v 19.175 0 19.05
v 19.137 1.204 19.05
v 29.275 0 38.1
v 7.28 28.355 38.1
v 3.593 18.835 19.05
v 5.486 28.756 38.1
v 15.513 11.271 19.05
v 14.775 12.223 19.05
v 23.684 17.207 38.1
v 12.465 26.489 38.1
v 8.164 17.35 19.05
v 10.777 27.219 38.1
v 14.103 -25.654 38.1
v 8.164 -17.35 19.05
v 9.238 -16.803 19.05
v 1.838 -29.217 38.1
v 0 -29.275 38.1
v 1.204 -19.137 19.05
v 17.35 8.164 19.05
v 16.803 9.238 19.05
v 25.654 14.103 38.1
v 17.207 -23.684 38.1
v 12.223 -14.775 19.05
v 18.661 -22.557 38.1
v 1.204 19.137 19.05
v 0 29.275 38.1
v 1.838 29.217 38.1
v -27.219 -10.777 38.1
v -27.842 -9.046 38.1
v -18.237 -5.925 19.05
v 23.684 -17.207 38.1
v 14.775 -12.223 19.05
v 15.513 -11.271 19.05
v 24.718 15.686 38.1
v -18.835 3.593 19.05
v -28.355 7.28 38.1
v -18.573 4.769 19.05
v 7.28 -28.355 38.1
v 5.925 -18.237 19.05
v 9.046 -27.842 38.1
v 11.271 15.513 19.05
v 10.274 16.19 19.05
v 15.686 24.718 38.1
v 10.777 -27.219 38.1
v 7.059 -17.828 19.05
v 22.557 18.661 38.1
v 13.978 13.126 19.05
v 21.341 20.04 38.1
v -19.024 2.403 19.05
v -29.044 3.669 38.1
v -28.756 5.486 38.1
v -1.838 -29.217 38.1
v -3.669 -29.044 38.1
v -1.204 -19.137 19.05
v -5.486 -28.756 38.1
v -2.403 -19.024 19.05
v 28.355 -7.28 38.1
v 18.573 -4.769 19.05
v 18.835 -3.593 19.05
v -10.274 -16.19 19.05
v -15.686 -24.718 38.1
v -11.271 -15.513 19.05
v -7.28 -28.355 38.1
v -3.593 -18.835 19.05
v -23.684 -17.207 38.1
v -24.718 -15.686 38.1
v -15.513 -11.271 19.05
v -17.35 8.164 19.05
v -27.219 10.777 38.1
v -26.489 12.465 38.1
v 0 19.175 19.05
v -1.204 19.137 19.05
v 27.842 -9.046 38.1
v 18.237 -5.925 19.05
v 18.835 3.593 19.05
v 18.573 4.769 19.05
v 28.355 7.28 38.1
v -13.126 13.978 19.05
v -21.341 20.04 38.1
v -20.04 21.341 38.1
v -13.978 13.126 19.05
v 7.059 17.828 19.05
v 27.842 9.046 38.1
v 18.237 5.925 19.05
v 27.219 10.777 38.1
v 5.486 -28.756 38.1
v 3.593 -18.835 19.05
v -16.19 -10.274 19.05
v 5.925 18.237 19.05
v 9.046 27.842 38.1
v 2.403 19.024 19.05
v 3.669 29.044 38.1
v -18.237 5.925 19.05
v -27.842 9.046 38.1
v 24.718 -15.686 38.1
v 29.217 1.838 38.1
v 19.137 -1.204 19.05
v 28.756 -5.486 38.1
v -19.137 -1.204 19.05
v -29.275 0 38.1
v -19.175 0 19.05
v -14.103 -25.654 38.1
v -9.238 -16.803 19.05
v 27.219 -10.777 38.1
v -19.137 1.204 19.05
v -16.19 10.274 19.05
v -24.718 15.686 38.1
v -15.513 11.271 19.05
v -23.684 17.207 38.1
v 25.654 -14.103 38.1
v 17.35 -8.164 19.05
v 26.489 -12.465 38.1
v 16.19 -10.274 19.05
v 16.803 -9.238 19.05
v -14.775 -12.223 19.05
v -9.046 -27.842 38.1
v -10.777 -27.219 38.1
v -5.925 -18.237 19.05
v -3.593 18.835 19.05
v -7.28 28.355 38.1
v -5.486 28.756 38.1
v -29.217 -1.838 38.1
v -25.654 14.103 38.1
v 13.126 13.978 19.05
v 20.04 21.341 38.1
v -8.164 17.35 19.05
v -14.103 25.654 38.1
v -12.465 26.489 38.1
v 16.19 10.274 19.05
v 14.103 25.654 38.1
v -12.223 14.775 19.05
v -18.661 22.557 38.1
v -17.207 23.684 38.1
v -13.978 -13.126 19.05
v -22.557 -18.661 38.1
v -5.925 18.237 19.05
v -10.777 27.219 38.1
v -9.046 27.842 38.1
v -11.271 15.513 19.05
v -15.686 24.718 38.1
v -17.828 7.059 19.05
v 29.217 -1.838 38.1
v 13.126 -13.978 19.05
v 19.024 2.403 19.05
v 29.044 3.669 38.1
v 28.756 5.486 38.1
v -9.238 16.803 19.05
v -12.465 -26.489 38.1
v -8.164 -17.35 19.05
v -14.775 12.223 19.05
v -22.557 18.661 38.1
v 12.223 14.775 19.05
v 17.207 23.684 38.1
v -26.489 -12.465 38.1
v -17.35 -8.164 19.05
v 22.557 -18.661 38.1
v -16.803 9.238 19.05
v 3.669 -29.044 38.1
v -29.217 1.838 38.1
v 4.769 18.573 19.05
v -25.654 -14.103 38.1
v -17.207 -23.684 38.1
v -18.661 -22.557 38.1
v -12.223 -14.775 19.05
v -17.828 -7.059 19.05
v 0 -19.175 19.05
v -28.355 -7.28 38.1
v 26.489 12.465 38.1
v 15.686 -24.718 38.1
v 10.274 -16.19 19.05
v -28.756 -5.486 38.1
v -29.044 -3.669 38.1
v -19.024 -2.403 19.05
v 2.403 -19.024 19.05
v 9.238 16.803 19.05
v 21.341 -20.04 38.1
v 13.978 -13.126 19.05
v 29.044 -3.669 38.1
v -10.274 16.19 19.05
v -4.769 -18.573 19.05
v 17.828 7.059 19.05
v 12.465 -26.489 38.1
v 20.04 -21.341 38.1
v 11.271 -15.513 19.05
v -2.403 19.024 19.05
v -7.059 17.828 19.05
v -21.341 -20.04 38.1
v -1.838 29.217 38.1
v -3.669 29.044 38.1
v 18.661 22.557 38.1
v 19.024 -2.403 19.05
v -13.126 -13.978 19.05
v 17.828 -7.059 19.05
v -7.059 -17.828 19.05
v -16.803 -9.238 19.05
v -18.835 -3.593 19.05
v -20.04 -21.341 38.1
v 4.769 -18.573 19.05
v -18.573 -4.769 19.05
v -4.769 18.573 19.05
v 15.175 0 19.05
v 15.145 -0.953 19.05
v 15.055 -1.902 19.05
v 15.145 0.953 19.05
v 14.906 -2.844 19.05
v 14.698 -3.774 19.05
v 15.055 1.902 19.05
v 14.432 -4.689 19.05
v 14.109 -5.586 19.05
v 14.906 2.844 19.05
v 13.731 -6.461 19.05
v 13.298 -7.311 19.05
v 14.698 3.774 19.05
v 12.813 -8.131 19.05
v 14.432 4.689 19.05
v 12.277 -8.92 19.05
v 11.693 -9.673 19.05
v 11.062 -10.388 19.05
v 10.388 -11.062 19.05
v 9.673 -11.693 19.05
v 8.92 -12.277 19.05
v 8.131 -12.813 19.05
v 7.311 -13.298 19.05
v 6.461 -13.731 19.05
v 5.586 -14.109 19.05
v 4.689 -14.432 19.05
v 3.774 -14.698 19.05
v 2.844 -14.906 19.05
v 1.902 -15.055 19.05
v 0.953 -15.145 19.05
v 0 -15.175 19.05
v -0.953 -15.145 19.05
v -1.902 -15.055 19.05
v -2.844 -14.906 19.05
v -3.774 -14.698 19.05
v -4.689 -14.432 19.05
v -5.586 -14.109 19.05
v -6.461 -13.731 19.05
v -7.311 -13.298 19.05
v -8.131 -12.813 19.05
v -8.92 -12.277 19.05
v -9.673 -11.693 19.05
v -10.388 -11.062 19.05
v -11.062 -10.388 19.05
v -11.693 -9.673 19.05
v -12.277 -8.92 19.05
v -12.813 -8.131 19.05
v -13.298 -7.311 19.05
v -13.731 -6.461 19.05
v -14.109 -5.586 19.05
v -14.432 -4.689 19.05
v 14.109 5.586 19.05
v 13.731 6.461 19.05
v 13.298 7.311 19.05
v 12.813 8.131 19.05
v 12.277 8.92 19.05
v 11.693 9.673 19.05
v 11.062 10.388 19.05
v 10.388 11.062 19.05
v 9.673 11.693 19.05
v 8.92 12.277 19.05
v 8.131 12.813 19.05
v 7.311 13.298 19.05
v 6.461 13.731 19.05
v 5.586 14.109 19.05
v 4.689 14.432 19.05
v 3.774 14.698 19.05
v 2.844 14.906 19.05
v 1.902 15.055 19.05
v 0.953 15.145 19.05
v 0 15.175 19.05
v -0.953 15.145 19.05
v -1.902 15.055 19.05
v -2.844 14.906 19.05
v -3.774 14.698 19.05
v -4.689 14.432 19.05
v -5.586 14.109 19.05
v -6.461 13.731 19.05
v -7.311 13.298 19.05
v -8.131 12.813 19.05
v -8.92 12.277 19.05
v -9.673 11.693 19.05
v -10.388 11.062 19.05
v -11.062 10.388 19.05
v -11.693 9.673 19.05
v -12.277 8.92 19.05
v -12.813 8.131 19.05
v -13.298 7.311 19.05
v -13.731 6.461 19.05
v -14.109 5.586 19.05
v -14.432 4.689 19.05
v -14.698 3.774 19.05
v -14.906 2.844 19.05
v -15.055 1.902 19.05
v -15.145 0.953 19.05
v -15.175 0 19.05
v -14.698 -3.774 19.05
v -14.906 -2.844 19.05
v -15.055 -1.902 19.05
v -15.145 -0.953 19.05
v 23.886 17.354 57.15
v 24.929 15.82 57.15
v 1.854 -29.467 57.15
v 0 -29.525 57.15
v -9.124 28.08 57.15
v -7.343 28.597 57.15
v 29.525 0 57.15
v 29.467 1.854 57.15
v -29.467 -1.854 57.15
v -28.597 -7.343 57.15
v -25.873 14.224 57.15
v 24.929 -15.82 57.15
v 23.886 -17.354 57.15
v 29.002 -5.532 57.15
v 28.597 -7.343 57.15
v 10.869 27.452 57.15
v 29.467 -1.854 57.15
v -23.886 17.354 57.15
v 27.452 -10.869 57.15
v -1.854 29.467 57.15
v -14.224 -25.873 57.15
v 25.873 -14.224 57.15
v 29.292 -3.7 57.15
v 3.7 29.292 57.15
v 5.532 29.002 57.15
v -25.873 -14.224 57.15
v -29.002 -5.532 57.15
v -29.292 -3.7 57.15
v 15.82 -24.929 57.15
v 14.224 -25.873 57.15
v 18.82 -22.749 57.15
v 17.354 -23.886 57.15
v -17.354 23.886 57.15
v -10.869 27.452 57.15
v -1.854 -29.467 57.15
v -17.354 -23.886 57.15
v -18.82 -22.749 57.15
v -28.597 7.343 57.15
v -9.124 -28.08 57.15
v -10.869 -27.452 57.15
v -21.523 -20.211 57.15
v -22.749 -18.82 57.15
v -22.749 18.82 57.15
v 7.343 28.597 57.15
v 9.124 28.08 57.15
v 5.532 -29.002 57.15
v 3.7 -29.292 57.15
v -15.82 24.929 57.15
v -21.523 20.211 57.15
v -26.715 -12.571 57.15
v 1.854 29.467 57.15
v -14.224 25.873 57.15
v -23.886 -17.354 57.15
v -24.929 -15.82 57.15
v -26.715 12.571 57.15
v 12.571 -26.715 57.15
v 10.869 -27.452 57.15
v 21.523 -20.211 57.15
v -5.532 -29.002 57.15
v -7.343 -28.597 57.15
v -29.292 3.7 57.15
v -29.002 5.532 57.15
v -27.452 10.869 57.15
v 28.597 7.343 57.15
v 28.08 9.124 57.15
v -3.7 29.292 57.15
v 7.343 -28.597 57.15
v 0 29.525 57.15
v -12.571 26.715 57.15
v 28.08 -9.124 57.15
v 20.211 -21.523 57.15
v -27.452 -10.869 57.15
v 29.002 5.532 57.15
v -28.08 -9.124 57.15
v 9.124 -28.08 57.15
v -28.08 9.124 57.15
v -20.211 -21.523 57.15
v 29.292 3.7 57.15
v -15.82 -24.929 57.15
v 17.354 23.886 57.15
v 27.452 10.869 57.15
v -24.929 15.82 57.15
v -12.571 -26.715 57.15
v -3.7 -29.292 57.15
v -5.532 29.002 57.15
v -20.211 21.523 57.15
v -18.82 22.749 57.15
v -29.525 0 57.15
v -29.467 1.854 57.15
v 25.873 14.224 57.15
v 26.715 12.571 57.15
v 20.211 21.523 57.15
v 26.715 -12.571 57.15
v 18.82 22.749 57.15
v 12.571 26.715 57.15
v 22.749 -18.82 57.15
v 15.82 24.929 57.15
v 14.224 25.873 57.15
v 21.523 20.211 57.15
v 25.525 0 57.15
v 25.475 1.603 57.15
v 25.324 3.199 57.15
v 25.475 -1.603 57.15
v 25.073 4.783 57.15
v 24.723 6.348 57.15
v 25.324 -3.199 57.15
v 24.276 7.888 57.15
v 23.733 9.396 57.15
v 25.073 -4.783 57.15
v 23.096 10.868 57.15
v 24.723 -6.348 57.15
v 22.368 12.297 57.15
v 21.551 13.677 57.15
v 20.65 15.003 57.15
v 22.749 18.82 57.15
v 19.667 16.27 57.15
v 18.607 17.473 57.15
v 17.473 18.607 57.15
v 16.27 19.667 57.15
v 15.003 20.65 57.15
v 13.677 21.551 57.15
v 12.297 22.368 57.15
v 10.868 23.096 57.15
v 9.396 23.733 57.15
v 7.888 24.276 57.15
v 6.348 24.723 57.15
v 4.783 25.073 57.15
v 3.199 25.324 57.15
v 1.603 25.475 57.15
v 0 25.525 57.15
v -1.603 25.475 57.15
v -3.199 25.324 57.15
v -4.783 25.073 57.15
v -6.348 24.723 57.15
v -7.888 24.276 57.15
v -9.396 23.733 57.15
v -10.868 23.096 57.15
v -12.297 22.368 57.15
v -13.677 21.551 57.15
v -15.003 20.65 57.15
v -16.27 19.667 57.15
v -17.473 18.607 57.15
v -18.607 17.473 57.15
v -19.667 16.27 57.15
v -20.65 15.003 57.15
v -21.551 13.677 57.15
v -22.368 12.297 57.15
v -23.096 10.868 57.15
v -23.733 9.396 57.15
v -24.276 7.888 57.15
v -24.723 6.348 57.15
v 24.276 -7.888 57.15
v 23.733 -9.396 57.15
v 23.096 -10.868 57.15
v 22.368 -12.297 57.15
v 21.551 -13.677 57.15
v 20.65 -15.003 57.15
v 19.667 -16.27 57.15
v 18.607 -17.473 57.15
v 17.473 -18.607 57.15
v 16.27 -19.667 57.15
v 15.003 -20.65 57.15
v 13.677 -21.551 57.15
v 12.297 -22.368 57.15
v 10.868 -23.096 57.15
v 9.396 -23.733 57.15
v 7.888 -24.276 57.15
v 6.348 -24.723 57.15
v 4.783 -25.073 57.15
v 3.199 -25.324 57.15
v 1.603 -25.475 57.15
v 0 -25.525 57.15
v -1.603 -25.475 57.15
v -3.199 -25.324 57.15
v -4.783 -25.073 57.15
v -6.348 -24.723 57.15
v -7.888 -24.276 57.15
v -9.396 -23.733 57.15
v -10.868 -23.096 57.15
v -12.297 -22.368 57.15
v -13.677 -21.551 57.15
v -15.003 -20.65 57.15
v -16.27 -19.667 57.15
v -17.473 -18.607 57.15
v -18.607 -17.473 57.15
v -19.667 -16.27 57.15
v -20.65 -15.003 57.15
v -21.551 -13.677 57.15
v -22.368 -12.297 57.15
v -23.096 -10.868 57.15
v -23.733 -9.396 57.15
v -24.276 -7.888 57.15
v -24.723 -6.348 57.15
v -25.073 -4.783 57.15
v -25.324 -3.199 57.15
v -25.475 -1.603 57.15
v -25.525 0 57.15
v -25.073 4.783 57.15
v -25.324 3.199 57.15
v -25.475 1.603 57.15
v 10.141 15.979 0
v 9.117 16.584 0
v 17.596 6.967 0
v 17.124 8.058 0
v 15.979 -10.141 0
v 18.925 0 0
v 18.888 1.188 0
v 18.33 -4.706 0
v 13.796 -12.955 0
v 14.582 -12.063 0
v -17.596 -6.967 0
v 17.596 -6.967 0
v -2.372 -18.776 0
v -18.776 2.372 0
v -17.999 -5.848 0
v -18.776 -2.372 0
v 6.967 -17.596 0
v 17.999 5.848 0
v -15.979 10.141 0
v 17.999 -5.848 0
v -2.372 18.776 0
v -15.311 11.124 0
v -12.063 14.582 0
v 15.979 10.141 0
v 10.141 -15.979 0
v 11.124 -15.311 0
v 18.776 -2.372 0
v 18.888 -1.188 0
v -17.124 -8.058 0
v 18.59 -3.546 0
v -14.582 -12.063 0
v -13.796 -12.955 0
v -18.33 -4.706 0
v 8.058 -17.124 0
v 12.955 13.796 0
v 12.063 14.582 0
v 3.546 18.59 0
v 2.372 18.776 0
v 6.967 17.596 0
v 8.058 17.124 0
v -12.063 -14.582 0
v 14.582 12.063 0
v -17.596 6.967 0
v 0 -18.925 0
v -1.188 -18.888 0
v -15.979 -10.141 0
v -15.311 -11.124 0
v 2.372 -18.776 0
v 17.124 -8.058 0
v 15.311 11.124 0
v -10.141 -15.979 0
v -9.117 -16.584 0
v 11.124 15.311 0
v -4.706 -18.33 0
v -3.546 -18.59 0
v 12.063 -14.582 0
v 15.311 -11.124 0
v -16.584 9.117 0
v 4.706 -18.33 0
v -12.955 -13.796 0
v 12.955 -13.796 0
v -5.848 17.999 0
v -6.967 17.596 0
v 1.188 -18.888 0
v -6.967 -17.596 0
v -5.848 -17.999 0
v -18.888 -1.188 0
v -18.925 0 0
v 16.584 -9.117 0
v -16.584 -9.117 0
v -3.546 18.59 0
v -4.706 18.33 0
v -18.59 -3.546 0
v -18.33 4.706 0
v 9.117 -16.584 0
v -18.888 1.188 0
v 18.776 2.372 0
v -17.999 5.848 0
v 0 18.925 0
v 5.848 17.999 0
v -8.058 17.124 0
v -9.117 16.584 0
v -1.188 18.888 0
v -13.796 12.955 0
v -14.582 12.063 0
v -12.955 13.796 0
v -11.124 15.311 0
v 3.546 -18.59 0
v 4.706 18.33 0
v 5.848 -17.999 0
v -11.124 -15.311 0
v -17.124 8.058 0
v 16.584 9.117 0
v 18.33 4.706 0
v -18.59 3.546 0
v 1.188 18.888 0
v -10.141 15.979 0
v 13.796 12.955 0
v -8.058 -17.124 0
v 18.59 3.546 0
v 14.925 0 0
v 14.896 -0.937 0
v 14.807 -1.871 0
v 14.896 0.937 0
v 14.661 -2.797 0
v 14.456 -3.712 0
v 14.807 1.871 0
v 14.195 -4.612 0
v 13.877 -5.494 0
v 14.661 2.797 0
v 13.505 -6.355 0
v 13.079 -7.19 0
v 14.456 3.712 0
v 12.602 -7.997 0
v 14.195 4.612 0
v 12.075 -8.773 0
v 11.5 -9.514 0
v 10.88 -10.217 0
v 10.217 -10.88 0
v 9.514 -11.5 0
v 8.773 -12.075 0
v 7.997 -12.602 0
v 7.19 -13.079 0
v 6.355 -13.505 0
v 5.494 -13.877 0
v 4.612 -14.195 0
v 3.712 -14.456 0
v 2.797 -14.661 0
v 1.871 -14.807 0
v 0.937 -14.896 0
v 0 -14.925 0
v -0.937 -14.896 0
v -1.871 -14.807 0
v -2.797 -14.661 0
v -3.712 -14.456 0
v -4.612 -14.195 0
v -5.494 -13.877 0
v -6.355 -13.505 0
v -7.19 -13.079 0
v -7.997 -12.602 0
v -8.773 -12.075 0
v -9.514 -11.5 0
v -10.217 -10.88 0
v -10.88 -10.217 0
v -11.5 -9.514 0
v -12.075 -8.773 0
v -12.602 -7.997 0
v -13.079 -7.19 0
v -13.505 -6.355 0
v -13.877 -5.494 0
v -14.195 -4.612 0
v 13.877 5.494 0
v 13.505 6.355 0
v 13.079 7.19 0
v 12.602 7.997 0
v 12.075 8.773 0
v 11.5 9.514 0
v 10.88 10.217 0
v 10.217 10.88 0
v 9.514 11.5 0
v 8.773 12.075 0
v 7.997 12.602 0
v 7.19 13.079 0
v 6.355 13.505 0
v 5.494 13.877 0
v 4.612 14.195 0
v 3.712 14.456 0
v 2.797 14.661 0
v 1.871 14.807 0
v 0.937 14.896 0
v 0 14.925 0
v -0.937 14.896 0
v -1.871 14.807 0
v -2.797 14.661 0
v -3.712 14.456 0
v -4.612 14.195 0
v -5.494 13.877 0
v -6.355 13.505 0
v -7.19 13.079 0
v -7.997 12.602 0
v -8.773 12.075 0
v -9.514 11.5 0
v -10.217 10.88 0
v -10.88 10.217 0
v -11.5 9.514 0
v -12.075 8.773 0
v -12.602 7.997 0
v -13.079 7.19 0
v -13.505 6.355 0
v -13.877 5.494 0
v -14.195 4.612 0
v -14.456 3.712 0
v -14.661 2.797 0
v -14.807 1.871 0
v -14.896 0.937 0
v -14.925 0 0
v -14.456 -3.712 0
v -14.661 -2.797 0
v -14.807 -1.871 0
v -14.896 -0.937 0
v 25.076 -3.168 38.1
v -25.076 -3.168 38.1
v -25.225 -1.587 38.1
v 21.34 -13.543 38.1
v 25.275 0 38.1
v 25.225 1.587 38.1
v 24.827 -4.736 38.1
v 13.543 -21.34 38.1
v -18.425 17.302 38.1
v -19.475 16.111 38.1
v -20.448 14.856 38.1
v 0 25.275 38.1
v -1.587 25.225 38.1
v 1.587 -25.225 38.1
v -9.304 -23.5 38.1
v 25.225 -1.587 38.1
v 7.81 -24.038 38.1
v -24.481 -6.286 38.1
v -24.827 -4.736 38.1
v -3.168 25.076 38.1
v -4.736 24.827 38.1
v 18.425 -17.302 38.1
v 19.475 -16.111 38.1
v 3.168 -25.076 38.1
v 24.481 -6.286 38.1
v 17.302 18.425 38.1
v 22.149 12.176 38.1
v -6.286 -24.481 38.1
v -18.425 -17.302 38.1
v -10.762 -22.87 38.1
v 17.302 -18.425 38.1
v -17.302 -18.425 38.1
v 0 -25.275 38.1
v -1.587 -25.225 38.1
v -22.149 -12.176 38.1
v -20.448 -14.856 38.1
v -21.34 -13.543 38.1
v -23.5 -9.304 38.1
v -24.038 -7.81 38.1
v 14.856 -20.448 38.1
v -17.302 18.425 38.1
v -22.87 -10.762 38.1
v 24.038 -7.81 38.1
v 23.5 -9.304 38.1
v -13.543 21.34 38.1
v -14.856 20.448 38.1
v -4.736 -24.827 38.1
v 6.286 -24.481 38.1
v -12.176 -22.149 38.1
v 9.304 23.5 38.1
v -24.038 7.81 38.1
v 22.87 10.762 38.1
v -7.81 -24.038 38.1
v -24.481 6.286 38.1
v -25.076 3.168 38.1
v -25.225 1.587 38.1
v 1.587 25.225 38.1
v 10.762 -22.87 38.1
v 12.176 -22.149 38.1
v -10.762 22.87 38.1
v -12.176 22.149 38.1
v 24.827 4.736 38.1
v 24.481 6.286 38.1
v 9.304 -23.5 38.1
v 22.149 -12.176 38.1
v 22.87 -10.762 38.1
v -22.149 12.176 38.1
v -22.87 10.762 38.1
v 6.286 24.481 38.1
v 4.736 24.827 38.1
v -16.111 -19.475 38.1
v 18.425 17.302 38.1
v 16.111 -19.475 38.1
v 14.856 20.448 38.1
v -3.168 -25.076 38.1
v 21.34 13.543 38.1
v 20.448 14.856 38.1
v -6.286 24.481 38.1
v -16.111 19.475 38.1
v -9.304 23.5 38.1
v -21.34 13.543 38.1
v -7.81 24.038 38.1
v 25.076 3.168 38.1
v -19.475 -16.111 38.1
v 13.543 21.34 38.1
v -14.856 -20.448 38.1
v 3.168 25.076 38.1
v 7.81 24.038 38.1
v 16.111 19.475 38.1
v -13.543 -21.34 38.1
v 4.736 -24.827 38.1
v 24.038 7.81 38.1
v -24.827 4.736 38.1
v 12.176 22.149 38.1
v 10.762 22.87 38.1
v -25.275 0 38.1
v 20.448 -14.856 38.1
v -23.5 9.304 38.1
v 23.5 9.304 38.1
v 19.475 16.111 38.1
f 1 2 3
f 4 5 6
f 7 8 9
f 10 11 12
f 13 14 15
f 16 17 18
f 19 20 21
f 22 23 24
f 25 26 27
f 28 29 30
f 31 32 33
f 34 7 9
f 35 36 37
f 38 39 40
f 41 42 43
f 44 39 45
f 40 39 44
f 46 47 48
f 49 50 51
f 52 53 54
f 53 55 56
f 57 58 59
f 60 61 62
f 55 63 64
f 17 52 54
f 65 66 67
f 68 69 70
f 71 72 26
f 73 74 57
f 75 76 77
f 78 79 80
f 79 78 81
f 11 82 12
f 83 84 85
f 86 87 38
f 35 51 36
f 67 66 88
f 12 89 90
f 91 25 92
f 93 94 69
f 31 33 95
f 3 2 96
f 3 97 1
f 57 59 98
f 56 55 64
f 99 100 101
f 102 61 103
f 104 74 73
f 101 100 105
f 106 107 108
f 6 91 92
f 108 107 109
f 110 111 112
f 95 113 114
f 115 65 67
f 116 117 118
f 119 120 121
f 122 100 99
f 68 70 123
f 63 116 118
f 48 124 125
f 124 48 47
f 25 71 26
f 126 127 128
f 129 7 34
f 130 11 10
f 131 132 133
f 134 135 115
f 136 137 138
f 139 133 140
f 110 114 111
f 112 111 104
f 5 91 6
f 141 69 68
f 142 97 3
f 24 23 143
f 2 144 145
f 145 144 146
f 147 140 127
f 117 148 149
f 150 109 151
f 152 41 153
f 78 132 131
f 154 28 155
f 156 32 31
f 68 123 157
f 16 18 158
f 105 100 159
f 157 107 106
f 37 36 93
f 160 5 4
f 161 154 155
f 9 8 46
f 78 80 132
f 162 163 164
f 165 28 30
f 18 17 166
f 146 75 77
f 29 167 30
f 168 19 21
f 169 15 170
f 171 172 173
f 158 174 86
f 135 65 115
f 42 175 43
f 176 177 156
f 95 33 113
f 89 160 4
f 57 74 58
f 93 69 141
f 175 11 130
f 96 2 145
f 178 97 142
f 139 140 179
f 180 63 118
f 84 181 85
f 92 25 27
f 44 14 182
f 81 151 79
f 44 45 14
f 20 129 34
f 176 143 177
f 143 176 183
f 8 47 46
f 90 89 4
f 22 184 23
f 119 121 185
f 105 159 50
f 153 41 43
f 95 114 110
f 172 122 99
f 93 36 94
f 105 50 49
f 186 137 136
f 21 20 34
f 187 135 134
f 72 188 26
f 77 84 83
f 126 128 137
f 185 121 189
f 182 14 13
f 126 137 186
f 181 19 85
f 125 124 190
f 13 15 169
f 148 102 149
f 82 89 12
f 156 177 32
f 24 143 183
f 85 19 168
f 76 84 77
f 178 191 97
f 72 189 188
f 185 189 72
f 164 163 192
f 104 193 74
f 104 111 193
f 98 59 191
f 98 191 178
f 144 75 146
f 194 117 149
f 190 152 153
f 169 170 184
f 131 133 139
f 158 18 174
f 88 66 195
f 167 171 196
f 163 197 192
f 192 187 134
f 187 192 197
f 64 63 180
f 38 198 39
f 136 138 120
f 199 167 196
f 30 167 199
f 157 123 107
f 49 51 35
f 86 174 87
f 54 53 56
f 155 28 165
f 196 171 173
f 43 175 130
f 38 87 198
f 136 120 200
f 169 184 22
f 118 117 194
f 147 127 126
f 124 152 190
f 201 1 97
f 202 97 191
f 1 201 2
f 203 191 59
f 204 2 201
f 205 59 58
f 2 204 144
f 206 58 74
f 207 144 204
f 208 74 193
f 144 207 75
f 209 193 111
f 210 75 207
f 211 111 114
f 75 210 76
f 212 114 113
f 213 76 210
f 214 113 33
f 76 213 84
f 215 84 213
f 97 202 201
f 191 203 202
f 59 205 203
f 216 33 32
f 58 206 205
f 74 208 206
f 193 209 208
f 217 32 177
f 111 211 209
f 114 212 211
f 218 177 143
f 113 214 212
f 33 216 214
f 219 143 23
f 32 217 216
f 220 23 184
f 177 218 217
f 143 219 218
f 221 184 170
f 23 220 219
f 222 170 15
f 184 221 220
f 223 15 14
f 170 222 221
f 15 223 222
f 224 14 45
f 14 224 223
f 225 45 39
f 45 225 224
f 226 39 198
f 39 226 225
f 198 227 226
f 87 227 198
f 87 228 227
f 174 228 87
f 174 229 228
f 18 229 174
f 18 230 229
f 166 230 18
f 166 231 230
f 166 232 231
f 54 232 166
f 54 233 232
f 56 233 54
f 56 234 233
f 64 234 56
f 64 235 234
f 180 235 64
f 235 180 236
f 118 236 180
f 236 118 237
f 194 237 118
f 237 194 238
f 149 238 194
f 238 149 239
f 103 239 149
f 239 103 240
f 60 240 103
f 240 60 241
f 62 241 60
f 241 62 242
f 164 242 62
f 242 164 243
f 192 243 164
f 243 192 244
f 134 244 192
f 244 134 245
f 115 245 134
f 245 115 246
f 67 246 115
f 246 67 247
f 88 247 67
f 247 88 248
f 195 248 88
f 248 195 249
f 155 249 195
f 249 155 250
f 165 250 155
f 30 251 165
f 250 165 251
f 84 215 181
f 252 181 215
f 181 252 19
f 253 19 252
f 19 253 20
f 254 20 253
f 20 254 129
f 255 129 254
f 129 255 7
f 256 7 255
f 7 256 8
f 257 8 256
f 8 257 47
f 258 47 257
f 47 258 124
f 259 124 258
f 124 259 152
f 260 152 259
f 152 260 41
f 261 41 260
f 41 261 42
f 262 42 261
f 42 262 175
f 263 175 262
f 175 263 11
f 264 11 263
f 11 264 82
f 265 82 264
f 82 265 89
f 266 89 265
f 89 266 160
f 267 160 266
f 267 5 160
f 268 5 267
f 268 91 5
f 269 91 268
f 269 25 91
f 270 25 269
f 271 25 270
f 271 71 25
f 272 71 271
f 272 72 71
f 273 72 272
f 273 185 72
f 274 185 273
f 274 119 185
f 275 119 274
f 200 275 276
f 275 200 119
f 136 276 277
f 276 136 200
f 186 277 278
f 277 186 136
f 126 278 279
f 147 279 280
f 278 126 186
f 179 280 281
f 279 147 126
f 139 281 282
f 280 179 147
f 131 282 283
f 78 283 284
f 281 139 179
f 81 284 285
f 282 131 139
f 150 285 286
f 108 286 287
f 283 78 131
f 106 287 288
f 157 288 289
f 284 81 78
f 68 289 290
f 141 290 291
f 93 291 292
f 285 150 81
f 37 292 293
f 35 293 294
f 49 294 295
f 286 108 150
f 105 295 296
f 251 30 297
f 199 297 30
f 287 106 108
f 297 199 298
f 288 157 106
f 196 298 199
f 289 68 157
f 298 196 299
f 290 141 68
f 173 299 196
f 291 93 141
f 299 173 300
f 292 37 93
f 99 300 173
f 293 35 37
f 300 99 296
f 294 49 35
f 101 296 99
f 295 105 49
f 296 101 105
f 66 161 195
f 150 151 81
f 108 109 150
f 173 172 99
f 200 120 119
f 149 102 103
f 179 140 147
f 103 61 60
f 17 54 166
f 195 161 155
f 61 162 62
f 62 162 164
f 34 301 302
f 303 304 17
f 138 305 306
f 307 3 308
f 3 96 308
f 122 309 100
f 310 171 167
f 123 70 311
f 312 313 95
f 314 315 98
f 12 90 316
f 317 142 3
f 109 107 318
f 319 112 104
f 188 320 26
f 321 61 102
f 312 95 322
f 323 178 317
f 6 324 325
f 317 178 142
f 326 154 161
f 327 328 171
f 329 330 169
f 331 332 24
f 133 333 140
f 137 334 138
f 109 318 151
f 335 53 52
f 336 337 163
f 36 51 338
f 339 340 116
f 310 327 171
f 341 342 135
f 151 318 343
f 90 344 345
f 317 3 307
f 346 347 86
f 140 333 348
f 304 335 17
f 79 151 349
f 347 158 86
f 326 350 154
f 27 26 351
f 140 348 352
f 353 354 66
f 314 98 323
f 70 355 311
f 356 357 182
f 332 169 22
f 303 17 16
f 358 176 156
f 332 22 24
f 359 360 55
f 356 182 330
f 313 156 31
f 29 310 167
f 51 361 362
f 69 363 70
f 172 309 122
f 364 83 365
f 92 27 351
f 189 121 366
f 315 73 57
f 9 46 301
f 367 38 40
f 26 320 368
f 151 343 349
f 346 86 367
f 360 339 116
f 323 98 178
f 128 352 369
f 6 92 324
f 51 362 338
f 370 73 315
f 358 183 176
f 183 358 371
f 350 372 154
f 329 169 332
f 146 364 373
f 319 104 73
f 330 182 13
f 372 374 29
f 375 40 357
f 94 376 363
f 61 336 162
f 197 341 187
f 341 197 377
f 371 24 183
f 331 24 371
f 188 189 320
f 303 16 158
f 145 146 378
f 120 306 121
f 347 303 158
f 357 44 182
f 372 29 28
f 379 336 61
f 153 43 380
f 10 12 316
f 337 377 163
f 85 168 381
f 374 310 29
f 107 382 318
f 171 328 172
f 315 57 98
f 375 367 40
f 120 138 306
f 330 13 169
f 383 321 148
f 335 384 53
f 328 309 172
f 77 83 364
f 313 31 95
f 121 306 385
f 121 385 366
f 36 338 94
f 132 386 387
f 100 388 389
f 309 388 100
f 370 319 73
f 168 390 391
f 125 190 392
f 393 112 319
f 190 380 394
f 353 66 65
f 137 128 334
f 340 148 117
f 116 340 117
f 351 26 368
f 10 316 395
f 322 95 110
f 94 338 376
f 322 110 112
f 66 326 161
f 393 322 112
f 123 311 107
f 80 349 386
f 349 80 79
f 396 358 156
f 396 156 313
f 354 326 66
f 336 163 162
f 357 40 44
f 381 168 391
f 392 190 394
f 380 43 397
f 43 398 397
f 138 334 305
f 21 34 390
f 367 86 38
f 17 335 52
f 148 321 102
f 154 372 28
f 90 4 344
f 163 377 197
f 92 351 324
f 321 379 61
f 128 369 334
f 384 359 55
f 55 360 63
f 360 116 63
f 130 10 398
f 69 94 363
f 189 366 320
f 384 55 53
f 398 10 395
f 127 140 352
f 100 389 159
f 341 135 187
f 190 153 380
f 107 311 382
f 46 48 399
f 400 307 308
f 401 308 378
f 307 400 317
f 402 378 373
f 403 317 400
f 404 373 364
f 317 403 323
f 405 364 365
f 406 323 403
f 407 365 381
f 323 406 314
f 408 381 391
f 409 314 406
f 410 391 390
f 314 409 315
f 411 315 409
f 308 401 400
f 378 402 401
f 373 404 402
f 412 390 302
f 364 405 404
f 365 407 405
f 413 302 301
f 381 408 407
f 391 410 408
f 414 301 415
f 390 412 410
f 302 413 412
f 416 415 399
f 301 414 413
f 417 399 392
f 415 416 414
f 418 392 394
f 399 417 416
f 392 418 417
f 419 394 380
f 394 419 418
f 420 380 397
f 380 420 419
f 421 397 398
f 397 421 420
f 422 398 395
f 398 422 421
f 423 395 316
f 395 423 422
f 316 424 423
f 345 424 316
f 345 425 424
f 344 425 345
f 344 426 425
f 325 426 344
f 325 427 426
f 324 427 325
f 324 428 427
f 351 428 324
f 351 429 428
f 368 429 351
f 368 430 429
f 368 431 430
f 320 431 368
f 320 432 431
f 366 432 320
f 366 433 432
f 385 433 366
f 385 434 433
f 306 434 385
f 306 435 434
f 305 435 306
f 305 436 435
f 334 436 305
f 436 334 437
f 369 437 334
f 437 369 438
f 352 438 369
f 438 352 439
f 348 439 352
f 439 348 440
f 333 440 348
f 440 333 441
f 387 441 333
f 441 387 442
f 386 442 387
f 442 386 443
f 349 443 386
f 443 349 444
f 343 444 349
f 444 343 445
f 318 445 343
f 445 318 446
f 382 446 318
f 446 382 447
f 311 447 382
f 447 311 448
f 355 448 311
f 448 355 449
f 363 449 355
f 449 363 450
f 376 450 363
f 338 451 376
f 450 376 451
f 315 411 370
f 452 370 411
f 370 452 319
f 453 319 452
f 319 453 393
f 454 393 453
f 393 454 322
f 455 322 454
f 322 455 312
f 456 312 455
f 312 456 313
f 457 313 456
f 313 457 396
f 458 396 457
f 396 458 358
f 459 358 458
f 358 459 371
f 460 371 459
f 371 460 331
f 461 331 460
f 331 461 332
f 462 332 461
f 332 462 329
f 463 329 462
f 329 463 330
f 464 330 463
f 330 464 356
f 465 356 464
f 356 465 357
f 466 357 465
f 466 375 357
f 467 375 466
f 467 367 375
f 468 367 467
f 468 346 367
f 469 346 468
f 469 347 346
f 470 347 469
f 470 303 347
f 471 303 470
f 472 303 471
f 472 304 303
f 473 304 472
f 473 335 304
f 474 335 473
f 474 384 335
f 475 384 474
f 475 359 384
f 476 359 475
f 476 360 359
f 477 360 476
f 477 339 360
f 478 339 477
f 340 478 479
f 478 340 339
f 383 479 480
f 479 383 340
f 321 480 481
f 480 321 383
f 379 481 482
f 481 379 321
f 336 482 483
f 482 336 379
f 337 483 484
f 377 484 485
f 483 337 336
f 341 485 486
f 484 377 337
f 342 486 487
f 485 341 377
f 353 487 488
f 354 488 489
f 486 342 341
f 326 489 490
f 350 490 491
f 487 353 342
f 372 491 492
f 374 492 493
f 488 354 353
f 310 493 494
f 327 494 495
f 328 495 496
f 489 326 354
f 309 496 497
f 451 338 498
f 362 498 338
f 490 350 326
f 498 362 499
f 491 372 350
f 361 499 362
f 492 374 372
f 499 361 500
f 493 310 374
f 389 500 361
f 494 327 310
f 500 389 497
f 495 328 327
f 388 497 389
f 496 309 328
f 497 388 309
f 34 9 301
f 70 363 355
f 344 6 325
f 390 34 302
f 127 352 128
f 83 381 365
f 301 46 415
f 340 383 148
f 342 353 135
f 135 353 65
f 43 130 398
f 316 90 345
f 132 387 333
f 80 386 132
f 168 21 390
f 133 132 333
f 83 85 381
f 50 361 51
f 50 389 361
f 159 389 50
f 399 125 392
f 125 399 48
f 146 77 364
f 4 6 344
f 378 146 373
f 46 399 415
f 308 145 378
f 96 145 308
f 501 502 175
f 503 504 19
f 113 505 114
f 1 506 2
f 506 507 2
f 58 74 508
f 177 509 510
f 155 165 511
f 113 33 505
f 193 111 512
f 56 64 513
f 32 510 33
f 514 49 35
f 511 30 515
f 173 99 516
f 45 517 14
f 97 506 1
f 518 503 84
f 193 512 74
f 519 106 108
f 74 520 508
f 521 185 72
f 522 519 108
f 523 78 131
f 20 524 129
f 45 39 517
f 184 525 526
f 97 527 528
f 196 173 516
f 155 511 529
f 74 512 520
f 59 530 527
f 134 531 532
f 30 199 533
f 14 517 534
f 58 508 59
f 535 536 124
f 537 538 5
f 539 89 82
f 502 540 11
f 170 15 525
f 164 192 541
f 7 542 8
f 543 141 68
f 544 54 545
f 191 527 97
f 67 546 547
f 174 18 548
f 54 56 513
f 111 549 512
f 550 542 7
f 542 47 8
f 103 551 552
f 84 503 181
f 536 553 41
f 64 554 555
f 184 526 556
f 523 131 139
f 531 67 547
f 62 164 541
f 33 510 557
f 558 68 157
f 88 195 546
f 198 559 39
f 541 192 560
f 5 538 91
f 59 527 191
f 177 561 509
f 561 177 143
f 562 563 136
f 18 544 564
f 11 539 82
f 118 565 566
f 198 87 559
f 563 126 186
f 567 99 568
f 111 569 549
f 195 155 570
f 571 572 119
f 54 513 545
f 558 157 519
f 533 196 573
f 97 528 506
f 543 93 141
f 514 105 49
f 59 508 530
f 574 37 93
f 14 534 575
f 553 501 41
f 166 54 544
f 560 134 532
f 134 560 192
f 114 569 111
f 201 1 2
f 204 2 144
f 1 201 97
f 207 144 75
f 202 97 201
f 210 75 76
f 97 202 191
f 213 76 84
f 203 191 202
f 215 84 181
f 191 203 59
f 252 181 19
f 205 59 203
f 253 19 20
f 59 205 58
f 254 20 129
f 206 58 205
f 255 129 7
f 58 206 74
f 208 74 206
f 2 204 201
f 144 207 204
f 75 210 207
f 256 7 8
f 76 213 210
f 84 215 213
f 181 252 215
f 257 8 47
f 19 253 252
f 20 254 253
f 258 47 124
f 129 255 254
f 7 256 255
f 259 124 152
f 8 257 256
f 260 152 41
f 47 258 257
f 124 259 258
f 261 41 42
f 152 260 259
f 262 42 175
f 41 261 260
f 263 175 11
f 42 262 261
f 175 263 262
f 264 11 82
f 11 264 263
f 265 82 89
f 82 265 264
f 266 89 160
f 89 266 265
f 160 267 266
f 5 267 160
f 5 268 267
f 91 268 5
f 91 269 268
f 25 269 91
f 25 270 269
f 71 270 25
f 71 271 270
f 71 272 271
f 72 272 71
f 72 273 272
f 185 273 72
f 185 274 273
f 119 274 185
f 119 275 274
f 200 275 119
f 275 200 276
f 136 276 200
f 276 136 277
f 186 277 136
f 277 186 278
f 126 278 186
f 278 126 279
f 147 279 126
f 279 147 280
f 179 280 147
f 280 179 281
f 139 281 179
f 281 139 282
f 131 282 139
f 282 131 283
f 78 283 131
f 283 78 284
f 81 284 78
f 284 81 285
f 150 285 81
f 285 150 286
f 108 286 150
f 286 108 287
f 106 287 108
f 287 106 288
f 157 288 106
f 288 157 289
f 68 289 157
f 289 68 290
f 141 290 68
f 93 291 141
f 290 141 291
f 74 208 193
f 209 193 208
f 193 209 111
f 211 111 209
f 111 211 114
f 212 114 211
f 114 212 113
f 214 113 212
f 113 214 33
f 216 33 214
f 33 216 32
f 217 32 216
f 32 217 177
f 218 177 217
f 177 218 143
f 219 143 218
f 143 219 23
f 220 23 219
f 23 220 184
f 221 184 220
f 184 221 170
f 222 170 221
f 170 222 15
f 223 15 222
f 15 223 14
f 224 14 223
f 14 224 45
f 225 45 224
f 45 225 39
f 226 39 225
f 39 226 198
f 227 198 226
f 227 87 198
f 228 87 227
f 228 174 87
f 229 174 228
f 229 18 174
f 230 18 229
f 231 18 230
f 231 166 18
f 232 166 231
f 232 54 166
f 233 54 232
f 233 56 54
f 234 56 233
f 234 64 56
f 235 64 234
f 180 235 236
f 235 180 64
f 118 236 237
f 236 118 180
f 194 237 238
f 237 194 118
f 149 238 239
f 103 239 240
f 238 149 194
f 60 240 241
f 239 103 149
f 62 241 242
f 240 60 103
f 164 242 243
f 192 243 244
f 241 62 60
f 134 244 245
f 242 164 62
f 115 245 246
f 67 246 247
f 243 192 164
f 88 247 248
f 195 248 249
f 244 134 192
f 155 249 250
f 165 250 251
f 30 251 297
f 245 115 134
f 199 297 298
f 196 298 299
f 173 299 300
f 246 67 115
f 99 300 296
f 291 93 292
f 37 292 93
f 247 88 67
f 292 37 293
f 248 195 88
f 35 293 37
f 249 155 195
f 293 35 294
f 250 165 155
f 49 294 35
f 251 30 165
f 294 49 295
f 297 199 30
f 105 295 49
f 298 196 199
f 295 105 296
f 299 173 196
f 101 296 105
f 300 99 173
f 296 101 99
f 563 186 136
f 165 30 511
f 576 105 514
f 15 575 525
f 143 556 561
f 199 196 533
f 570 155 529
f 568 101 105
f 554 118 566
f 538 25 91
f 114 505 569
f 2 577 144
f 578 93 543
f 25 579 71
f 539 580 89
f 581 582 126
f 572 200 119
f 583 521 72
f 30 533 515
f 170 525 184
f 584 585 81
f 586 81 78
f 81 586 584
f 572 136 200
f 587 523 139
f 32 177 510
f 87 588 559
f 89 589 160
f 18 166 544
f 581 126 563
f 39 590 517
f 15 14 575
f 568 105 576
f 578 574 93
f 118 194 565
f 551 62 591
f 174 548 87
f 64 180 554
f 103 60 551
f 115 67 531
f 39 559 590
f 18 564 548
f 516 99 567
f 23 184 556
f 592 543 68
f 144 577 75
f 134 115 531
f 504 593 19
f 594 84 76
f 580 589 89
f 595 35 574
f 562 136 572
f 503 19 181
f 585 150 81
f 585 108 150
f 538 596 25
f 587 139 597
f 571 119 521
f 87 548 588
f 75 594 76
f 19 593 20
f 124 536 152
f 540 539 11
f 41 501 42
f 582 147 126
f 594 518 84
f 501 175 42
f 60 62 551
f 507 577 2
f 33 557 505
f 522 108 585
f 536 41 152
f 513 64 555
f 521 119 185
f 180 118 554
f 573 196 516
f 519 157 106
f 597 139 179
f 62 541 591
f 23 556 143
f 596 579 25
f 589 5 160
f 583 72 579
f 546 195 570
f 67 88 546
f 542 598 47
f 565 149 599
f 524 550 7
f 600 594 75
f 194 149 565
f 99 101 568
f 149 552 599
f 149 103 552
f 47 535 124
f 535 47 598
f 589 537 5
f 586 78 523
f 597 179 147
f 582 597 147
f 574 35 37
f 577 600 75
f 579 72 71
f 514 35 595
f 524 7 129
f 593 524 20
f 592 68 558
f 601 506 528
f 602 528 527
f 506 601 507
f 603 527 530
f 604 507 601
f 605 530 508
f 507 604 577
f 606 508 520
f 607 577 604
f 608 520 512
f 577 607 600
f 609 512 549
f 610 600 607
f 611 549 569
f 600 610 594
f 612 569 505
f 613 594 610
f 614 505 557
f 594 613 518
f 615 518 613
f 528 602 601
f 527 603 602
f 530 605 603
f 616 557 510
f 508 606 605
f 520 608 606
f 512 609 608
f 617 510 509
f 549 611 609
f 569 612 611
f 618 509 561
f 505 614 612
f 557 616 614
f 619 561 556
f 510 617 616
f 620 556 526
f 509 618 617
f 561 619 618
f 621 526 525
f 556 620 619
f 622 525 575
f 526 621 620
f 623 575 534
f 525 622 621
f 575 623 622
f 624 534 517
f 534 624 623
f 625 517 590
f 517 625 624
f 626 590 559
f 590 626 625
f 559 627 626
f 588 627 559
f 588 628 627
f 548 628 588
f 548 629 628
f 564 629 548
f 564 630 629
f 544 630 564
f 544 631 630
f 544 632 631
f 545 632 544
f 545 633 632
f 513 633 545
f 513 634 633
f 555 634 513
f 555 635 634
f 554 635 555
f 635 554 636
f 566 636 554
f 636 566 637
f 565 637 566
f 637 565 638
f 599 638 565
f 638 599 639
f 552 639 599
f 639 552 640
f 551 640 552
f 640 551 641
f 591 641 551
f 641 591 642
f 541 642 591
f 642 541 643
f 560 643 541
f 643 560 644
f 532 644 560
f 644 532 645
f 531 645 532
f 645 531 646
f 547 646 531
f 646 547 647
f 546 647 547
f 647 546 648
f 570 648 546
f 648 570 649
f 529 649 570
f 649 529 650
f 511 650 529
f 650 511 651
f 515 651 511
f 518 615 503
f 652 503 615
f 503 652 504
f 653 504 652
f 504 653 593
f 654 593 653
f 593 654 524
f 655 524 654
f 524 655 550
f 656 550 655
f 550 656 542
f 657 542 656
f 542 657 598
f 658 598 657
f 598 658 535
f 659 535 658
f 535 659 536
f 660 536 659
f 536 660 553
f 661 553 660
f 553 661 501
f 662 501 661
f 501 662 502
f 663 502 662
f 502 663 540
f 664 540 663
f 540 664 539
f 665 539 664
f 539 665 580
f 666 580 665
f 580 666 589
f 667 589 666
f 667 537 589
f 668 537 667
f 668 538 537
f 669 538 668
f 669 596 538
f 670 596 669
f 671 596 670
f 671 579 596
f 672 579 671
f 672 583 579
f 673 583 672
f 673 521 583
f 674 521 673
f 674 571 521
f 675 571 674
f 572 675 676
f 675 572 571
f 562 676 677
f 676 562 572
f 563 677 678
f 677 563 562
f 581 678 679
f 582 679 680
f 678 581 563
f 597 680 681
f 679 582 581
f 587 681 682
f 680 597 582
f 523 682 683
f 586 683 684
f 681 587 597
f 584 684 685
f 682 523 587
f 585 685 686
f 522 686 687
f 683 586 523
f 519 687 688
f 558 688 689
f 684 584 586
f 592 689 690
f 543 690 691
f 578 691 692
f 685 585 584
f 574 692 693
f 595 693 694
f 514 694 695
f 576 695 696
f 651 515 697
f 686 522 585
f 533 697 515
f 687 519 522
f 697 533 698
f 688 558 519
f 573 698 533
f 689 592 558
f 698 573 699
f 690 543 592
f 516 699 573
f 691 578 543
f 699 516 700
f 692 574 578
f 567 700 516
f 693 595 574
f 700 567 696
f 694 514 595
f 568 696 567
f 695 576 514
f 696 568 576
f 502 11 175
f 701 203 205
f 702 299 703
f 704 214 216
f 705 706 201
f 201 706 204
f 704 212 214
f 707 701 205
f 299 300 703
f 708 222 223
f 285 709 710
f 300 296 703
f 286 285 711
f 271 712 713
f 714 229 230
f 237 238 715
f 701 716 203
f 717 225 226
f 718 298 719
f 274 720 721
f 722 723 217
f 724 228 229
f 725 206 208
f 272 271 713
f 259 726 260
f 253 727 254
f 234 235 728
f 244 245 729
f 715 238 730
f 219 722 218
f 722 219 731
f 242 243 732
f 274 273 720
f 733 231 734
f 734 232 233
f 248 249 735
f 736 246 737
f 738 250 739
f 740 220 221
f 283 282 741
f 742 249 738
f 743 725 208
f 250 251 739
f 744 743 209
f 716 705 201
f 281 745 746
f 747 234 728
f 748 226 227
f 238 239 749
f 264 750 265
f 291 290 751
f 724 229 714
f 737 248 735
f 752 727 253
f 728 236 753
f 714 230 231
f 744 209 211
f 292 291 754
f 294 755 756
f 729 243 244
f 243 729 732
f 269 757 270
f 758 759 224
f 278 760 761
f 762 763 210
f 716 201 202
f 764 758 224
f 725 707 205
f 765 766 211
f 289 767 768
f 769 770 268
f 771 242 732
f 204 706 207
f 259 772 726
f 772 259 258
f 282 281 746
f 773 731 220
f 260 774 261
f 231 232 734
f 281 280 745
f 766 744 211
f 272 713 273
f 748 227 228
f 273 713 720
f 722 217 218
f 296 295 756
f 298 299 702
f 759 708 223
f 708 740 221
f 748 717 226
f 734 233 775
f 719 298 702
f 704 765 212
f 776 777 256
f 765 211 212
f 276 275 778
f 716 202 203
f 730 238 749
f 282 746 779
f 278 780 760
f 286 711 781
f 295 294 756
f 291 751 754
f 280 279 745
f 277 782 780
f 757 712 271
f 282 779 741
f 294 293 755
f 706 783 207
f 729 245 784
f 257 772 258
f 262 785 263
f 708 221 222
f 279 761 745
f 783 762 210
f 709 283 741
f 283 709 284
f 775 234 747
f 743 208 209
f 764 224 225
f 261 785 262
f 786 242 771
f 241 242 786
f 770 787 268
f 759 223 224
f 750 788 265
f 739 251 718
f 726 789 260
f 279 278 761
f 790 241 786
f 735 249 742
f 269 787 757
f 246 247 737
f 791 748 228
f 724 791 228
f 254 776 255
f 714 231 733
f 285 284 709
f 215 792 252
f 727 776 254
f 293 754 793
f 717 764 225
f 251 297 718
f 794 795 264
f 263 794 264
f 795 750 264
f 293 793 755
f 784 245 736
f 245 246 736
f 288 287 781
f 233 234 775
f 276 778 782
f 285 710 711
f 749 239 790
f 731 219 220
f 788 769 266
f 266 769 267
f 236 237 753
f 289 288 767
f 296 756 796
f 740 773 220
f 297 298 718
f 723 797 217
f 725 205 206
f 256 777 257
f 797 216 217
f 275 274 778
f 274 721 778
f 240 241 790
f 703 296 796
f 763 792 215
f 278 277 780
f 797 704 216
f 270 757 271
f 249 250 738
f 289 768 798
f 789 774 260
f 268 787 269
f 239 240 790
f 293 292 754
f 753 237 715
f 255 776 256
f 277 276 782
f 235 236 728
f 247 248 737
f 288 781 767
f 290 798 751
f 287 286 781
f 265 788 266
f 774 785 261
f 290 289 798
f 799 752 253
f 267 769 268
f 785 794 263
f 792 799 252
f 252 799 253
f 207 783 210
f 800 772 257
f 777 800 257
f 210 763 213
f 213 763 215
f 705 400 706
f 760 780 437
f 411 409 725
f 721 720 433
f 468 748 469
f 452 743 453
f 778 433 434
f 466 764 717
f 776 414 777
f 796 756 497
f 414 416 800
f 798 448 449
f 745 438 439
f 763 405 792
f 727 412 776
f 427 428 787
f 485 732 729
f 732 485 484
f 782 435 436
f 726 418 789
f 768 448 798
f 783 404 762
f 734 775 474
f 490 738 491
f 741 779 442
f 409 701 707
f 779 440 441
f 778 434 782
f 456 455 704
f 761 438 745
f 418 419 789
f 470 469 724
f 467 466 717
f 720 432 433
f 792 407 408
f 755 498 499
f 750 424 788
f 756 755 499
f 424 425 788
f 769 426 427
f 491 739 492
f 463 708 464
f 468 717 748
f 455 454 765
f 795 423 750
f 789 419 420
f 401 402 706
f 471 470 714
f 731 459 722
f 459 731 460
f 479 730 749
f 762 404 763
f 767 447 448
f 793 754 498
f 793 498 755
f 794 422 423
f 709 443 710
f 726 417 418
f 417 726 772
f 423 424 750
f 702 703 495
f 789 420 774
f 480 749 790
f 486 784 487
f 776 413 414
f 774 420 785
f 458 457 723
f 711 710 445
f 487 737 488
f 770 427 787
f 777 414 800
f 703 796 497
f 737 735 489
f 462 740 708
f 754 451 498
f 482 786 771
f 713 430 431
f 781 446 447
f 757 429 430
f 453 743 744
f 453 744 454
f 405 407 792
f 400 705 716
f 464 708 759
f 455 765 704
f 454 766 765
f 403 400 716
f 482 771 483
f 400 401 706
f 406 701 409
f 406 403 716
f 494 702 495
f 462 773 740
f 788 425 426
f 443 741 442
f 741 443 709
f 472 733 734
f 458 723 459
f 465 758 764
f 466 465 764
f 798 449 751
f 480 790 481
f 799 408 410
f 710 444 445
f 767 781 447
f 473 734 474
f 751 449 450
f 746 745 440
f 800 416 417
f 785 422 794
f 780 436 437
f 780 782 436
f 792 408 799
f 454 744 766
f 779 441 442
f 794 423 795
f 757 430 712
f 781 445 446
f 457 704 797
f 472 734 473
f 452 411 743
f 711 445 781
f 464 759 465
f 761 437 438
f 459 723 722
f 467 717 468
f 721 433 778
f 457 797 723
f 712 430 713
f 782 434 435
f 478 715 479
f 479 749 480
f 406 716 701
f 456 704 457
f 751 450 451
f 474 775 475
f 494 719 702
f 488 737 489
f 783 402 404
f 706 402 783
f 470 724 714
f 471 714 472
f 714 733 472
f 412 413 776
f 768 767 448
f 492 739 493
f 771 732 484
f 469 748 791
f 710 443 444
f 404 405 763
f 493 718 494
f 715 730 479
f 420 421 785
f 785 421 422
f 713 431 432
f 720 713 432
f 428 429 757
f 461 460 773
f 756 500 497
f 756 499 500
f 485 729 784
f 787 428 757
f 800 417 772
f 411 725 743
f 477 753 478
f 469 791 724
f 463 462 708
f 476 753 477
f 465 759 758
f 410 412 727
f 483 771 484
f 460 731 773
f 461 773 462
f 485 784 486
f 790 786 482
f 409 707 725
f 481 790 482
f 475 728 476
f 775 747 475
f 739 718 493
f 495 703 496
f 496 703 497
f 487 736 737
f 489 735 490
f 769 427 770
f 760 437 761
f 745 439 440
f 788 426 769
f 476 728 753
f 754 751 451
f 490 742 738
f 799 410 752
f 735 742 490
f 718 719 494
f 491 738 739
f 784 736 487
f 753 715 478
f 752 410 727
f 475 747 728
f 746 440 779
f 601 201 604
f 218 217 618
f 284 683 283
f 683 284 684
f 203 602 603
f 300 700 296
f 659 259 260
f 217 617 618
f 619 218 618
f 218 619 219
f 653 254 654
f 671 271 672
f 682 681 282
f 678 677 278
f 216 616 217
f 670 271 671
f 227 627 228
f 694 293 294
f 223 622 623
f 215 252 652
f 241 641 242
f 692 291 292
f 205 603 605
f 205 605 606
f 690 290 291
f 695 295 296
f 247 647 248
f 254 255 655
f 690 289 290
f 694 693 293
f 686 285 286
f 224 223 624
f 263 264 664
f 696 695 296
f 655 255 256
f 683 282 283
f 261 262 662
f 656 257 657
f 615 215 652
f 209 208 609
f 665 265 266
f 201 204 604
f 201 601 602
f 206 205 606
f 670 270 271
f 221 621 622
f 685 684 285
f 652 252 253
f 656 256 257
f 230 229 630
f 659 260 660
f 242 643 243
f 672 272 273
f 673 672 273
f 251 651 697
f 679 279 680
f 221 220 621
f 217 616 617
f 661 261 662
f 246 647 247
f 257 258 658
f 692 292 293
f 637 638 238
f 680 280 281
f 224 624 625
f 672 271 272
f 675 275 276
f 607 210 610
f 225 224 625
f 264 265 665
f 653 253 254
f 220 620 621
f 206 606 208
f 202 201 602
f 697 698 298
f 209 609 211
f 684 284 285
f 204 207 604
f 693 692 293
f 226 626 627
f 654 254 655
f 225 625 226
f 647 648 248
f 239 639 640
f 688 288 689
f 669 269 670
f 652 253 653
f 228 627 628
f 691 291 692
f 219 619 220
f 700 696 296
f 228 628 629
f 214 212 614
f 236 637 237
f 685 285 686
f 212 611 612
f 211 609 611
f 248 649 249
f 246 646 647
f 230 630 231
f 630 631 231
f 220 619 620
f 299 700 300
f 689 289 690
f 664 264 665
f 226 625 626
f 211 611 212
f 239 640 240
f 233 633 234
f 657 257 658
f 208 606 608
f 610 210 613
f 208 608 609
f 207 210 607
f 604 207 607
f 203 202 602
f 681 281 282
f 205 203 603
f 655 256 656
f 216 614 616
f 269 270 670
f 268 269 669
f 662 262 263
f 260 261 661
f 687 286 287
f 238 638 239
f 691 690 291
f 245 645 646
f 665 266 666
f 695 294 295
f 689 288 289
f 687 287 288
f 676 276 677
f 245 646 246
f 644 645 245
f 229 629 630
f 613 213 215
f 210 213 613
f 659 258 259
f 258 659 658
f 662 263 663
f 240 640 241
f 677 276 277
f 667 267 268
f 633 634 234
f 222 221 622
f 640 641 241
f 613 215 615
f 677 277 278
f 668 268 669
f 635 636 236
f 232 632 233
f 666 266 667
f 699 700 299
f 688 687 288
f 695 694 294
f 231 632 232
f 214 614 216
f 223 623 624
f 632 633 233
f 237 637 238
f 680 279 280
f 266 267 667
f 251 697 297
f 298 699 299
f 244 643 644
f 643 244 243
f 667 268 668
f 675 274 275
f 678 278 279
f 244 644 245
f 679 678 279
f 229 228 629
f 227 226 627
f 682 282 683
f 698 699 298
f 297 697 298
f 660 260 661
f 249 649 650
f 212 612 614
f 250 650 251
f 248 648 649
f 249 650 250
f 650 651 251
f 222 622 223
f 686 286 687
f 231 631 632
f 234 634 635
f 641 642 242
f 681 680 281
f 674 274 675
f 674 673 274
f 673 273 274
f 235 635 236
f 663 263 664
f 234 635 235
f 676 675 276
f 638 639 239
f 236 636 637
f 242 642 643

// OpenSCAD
// version 2
// brian palmer, June 2019
// built in 3 parts. side a, adapter ring, and side b
// ID measurement type creates a female adapter, OD measurement creates a male adapter.
// Providing a taper value add a taper to make a press fit adapter. The direction of the taper is automatically adjusted depending on the gender of the adapter.

$fn=100;

/* [Side A] */
// side a (in mm) default 38.1 - 1.5" OD
sideADiameter=38.1; 
sideADiameterType="OD"; // [ID: ID - Female,OD: OD - Male]
// amount to taper side a. default is .25. 0 = no taper
sideATaper=.25;

/* [Side B] */
// side b (in mm) default 50.8 mm - 2" ID
sideBDiameter=50.8; 

sideBDiameterType="ID"; // [ID: ID - Female,OD: OD - Male]
// amount to taper side b. default is .25. 0 = no taper
sideBTaper=.25; 

/* [Wall] */
wallWidth=8;

/* [Overall Length] */
// Control length of adapter. (sideADiameter OD * overallLength)
overallAdjuster=1.5;

if (sideADiameterType == "ID")
{
   if (sideBDiameterType == "ID")
   {
       // ID, ID
       vacAdapter(sideADiameter + wallWidth, sideATaper, sideBDiameter + wallWidth, sideBTaper, wallWidth);
   } else {
       // ID, OD
       vacAdapter(sideADiameter + wallWidth, sideATaper, sideBDiameter, -sideBTaper, wallWidth);
   }
} else  {
   if (sideBDiameterType == "ID")
   {
       // OD, ID
       vacAdapter(sideADiameter, -sideATaper, sideBDiameter + wallWidth, sideBTaper, wallWidth);
   } else {
       // OD, OD
       vacAdapter(sideADiameter, -sideATaper, sideBDiameter, -sideBTaper, wallWidth);
   }
} 

module vacAdapter(sideADiameterOD, sideATaperAdjustment, sideBDiameterOD, sideBTaperAdjustment,wallWidth)
{
    colarLen = sideADiameterOD * (overallAdjuster/3);

    difference() {
        // outside wall
        adapter(sideADiameterOD, sideATaperAdjustment, sideBDiameterOD, sideBTaperAdjustment, colarLen);
        // inside wall
        adapter(sideADiameterOD-wallWidth, sideATaperAdjustment, sideBDiameterOD-wallWidth, sideBTaperAdjustment, colarLen);
    }
}

module adapter(sideADiameterOD, sideADiameterTaperAdjustment, sideBDiameterOD, sideBDiameterTaperAdjustment, colarLen) 
{
    union() {
        // side a
        cylinder(h=colarLen, d1=sideADiameterOD+sideADiameterTaperAdjustment, d2=sideADiameterOD-sideADiameterTaperAdjustment, center=false);
                
        translate([0,0,colarLen]) {
            // adapter ring
            cylinder(h=colarLen, d1=sideADiameterOD-sideADiameterTaperAdjustment, d2=sideBDiameterOD-sideBDiameterTaperAdjustment, center=false);
            translate([0,0,colarLen]) {
                // side b
                cylinder(h=colarLen, d1=sideBDiameterOD-sideBDiameterTaperAdjustment, d2=sideBDiameterOD+sideBDiameterTaperAdjustment, center=false);
            }        
        }
    }
}
